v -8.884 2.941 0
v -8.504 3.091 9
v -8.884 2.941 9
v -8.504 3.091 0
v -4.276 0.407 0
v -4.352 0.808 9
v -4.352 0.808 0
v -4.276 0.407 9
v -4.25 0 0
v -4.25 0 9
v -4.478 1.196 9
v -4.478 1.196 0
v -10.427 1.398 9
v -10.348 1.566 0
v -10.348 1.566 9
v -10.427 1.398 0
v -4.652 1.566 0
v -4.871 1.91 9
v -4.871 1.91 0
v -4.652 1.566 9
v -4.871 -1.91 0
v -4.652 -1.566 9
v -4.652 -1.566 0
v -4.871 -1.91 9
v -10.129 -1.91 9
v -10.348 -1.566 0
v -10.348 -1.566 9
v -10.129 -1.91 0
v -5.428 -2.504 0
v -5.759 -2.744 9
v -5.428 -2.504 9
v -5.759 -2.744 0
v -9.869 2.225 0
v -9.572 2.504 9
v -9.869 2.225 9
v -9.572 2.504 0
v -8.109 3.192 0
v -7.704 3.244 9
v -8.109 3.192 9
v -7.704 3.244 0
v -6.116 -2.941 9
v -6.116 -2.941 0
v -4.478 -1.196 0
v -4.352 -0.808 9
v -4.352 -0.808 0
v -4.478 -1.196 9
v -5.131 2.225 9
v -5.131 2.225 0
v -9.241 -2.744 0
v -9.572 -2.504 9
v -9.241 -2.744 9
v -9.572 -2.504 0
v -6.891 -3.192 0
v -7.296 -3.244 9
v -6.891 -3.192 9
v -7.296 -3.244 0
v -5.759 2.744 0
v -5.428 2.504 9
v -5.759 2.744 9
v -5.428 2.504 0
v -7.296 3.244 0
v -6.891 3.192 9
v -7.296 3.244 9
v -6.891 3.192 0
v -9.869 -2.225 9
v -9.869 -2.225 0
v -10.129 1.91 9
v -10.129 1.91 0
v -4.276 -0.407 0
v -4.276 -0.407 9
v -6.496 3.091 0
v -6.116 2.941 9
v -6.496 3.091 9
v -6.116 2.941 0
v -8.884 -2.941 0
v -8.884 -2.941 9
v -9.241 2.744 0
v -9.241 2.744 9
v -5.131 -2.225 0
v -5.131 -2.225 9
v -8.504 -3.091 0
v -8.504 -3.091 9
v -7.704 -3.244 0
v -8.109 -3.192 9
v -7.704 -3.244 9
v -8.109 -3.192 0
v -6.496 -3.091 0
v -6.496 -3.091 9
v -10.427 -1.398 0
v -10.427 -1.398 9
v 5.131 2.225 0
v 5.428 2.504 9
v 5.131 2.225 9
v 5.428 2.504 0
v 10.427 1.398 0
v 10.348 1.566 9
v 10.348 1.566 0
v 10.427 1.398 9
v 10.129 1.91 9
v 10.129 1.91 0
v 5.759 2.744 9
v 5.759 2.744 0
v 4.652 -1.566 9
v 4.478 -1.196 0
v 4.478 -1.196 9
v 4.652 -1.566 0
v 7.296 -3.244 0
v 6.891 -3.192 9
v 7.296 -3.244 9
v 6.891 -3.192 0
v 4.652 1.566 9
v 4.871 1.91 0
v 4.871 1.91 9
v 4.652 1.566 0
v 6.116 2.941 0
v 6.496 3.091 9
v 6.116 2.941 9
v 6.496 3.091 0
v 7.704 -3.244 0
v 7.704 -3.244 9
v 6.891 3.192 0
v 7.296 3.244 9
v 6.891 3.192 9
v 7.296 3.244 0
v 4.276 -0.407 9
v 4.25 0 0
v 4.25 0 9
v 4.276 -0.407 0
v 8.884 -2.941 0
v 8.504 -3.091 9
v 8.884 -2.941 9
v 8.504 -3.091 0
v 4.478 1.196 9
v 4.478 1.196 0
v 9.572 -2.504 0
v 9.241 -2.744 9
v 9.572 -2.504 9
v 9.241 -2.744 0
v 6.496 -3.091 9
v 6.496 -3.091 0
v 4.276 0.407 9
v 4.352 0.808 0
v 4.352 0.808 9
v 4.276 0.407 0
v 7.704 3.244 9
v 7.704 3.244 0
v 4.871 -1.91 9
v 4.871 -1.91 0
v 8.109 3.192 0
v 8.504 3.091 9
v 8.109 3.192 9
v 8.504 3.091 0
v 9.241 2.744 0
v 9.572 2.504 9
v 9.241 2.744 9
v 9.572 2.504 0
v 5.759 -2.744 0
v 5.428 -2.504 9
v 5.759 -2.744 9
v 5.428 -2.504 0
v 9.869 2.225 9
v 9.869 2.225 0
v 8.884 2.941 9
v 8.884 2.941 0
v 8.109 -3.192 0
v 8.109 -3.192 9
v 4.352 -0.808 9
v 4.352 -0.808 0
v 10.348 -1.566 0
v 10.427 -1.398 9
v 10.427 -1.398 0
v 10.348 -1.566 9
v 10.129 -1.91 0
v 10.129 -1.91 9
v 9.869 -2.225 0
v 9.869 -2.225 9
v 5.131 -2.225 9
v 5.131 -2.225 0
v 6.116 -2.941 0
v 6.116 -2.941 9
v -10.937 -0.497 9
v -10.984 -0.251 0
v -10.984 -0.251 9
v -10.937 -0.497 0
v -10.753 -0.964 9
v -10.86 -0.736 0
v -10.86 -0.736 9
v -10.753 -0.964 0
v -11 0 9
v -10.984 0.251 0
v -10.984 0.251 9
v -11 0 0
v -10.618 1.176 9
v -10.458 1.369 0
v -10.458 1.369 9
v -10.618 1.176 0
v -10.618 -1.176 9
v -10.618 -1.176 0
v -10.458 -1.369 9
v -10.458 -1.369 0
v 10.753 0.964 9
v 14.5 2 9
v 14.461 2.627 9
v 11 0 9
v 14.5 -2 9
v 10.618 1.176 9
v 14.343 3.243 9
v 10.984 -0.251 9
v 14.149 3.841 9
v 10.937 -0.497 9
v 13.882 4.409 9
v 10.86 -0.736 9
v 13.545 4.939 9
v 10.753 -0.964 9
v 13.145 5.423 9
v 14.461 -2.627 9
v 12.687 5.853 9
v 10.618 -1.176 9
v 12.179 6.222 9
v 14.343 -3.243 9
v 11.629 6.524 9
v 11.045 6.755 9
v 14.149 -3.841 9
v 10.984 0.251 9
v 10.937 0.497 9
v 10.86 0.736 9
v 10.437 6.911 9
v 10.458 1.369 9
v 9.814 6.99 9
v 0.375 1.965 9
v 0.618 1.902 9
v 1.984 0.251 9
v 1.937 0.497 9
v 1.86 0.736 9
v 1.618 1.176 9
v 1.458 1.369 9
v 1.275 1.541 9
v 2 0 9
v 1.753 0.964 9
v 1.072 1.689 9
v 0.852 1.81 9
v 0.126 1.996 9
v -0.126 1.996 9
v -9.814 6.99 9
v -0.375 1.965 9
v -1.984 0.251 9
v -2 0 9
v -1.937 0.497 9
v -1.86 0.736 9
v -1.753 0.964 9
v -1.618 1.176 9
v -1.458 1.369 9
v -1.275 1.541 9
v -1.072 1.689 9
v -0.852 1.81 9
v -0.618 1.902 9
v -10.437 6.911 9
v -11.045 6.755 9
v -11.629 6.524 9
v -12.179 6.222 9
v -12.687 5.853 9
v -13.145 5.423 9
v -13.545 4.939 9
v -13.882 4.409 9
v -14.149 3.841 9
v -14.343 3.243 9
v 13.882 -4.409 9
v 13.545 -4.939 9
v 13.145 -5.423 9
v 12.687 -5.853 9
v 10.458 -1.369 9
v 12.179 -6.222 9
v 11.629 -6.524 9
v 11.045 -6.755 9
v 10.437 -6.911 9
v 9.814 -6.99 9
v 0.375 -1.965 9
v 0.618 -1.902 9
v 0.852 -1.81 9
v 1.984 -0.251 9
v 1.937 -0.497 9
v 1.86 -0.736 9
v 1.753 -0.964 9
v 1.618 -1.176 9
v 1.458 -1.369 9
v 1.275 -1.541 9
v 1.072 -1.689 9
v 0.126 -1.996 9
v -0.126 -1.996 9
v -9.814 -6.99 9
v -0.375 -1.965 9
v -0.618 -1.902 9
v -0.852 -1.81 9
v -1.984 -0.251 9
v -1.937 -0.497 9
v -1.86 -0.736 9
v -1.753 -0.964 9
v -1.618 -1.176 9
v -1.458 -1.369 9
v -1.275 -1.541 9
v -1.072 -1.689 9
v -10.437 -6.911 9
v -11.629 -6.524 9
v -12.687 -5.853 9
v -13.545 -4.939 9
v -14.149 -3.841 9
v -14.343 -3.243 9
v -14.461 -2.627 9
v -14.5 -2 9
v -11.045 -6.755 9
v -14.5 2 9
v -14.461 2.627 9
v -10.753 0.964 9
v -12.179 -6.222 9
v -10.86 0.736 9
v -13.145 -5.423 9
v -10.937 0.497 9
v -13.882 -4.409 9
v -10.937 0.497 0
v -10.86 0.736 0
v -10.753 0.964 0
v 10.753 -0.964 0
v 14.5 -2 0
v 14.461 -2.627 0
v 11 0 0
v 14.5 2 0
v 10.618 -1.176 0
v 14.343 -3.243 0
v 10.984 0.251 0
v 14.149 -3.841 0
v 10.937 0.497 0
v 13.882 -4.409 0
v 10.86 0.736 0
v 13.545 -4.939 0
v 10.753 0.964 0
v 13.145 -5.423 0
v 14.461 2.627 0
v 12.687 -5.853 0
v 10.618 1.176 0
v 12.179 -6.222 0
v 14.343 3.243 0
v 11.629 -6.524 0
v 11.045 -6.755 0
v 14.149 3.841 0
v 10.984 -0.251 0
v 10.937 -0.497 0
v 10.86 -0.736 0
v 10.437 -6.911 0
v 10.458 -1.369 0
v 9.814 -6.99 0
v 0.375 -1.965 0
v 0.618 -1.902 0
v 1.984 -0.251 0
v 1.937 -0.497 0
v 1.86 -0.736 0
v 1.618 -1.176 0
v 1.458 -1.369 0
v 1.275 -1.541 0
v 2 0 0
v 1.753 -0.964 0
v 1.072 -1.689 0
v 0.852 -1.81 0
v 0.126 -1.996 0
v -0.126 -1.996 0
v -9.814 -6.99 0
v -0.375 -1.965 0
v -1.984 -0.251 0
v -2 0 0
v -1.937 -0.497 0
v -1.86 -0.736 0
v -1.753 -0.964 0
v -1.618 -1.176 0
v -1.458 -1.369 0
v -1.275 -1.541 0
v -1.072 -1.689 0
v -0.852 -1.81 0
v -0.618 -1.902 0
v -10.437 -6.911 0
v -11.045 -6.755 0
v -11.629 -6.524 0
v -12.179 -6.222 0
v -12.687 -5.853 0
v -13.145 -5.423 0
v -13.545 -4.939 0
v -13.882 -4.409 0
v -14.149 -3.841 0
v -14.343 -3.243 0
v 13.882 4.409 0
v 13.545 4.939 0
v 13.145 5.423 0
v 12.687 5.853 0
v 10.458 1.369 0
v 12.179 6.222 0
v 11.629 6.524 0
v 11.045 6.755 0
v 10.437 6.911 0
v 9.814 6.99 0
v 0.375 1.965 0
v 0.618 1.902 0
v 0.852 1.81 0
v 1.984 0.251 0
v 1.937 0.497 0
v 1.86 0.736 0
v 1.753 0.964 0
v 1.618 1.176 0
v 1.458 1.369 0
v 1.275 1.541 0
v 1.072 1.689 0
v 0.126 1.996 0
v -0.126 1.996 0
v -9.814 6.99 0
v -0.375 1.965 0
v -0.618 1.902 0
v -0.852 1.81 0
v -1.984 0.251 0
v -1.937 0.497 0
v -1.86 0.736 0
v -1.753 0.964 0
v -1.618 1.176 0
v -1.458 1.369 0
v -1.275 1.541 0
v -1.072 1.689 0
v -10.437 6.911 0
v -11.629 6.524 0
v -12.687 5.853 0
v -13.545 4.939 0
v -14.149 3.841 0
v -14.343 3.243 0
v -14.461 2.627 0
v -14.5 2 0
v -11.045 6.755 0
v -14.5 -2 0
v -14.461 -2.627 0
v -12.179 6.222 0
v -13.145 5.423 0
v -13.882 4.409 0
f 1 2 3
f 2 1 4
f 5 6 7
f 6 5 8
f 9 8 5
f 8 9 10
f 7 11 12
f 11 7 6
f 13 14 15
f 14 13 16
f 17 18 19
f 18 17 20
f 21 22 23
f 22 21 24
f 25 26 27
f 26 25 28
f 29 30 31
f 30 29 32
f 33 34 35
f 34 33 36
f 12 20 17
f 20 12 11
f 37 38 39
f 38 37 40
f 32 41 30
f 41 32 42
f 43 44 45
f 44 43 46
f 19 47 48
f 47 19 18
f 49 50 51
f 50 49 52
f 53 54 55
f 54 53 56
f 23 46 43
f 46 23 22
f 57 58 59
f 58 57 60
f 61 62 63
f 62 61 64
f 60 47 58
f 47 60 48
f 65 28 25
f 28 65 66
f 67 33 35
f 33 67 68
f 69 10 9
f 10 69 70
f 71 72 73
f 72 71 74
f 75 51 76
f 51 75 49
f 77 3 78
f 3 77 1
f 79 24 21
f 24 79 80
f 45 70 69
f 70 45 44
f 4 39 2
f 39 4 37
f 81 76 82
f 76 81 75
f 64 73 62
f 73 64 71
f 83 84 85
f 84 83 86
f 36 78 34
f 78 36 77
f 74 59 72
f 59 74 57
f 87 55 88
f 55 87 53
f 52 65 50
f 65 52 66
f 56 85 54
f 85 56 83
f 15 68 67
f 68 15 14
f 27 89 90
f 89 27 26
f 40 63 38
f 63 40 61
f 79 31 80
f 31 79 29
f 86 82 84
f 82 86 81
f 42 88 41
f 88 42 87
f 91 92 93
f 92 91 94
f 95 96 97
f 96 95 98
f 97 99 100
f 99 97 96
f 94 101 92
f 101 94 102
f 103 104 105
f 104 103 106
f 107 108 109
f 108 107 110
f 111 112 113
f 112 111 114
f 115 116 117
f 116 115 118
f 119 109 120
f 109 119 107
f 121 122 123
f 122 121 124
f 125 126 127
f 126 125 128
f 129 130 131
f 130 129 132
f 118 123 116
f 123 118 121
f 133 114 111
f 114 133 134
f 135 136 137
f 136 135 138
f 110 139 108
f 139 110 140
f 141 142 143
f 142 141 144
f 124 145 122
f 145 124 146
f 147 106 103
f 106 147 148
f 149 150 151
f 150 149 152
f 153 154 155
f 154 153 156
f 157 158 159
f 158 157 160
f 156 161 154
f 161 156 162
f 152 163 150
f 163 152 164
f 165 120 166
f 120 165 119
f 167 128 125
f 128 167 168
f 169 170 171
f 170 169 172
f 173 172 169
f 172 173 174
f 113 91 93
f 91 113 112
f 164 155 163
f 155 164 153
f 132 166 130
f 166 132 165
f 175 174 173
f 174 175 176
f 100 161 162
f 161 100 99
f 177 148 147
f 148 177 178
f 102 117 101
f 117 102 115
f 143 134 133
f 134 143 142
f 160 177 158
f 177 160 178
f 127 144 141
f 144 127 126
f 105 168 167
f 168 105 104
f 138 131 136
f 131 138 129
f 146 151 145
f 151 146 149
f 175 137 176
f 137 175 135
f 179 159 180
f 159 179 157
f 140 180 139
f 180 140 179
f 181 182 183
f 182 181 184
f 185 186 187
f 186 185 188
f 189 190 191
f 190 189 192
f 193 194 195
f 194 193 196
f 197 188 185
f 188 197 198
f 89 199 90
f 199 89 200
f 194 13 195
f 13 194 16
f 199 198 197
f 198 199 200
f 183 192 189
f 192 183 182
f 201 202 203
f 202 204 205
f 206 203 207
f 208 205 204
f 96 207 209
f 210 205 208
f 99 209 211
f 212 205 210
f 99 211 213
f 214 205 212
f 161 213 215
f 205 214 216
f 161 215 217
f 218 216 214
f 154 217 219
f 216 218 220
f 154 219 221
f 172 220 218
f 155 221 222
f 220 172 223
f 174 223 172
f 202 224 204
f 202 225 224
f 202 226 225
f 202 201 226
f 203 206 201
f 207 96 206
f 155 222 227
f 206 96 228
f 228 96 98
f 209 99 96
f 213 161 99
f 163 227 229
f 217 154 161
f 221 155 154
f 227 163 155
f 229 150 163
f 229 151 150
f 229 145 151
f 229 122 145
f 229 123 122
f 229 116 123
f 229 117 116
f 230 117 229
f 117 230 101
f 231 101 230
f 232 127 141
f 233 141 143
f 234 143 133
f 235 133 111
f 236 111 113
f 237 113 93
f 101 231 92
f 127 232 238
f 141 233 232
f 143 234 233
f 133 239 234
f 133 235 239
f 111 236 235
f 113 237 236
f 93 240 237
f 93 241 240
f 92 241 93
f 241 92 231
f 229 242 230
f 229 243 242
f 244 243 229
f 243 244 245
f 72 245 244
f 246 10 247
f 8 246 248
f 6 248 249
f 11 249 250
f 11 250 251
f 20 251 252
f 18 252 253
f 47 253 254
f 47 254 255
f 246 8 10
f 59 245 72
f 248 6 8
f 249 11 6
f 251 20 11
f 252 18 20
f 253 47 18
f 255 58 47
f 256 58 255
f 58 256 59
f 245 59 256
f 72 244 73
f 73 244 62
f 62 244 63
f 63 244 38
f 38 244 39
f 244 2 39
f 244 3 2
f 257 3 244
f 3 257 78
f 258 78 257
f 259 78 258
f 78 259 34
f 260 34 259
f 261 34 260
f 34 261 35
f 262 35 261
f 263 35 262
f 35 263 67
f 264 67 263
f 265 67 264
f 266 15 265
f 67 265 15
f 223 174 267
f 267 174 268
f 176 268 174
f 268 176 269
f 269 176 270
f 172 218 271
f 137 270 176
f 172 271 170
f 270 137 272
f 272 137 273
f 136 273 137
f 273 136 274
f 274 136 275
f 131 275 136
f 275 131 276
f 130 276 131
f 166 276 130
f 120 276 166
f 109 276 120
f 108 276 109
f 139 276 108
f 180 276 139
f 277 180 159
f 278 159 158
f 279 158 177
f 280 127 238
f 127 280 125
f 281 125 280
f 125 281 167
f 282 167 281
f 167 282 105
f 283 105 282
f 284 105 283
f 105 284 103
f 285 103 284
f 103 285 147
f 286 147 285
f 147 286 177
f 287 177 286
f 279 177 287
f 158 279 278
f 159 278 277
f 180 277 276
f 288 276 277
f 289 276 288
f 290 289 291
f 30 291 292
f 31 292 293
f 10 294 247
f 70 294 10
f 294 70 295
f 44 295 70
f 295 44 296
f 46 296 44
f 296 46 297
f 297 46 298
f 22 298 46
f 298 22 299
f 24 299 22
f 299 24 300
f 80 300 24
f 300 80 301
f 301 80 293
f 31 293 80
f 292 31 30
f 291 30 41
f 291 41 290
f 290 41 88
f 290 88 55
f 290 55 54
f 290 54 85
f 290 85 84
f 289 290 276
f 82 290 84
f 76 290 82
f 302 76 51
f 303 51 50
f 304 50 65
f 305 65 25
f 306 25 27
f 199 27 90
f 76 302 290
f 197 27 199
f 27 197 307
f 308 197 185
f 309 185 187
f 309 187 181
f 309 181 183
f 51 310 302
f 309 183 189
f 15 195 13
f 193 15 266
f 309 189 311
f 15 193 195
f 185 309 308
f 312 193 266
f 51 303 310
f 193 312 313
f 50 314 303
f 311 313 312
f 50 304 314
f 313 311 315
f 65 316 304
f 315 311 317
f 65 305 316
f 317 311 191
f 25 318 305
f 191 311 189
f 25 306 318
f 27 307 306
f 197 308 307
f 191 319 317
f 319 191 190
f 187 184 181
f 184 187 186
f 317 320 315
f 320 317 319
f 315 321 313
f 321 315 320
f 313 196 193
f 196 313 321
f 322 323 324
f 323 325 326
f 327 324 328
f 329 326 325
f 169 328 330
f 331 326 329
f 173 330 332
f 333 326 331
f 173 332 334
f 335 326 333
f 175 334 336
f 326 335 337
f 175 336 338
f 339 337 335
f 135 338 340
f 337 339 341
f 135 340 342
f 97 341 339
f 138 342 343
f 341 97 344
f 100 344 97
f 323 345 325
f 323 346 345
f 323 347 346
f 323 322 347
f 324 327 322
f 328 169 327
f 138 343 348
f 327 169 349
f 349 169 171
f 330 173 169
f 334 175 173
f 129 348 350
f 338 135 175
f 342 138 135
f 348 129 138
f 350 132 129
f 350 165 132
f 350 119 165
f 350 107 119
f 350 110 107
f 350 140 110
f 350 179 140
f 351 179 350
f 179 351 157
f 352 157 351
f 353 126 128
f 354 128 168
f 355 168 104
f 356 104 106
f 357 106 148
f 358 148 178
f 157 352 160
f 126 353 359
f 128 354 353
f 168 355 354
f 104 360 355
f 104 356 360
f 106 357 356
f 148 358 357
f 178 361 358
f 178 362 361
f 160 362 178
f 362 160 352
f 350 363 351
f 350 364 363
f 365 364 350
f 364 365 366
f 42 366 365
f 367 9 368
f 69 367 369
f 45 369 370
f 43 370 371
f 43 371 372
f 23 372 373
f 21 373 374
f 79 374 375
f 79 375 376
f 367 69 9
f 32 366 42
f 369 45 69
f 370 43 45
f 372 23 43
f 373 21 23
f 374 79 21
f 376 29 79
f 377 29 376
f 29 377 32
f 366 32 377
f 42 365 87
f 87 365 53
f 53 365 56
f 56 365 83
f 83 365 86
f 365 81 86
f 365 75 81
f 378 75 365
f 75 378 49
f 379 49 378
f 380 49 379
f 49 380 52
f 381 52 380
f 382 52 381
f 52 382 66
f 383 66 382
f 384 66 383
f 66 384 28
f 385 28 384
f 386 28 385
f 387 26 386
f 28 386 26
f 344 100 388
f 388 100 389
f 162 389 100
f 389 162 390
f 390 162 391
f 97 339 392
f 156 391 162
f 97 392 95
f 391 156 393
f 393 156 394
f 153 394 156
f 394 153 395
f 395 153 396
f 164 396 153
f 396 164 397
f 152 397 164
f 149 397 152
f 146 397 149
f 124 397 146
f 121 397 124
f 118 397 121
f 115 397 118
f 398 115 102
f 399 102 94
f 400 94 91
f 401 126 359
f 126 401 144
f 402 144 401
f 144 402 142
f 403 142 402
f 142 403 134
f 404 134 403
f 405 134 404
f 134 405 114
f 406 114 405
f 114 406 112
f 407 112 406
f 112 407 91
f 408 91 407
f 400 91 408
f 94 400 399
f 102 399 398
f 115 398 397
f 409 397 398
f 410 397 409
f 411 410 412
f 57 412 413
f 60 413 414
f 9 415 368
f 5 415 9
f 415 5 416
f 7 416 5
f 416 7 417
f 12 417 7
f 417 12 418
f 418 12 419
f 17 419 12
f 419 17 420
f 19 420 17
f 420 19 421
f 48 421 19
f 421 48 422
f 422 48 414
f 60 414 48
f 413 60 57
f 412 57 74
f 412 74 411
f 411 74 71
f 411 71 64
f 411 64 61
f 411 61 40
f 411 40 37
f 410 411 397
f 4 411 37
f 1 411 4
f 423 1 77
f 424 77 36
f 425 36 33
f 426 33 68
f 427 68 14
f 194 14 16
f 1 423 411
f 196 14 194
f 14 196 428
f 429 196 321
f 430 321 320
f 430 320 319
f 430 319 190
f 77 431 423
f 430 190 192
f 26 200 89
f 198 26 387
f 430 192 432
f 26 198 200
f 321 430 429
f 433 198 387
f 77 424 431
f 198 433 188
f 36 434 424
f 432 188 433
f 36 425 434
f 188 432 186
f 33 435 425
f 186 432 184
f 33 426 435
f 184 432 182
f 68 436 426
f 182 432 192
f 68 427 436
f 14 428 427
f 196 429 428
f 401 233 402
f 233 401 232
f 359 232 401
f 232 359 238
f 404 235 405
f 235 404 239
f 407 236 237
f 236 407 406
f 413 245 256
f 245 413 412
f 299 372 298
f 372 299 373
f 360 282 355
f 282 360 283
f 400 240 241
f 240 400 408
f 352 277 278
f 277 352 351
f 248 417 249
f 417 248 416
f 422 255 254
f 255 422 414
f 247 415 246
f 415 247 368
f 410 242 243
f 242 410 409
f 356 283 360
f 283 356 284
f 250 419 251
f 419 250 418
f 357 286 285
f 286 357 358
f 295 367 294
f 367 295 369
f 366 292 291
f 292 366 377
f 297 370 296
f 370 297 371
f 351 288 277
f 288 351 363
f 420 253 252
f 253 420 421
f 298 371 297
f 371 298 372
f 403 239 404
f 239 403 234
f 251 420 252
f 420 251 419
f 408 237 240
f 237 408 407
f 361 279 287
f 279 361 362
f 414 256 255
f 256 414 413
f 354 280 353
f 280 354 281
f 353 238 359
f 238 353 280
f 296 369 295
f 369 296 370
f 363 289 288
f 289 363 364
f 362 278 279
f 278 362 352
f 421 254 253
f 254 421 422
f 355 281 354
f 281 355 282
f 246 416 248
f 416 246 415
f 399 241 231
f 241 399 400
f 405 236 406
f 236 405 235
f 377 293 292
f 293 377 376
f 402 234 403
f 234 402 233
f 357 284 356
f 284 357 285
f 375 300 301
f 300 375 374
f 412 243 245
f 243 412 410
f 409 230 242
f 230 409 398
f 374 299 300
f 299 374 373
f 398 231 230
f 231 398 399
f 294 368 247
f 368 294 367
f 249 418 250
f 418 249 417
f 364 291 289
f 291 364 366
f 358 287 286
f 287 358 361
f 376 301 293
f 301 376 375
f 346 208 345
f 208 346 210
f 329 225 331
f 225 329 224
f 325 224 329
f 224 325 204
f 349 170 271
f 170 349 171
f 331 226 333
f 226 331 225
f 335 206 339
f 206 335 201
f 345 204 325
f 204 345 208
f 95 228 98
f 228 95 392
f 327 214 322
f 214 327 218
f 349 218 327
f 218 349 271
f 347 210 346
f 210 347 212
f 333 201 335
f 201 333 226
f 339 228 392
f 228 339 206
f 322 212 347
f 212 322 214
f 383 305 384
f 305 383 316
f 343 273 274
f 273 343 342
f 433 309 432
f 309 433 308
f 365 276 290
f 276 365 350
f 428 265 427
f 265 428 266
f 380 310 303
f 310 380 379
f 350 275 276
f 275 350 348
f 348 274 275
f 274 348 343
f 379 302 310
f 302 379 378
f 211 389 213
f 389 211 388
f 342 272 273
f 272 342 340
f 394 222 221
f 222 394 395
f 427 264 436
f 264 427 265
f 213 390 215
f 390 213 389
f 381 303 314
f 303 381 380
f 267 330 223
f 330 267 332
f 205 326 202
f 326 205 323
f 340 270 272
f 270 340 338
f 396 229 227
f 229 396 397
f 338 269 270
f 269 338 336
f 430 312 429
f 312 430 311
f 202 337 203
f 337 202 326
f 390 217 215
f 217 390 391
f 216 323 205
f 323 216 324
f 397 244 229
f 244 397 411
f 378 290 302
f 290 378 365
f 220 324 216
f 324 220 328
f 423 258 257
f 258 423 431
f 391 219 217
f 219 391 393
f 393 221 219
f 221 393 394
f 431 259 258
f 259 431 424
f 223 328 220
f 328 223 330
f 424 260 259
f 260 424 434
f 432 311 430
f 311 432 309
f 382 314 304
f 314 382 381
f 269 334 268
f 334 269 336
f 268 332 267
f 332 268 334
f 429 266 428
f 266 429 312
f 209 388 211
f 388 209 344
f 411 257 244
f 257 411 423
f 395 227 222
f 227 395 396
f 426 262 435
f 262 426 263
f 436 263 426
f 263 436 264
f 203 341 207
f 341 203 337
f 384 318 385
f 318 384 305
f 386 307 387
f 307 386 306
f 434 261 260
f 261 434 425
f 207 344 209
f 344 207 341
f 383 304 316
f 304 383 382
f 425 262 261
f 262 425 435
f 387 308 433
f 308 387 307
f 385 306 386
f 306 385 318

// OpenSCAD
$fn = 50;

difference() {
	union() {
		hull() {
			translate(v = [-9.5, 2.0, 0]) {
				cylinder(h = 9, r = 5);
			}
			translate(v = [9.5, 2.0, 0]) {
				cylinder(h = 9, r = 5);
			}
			translate(v = [-9.5, -2.0, 0]) {
				cylinder(h = 9, r = 5);
			}
			translate(v = [9.5, -2.0, 0]) {
				cylinder(h = 9, r = 5);
			}
		}
	}
	union() {
		translate(v = [-7.5, 0.0, -100.0]) {
			cylinder(h = 200, r = 3.25);
		}
		translate(v = [7.5, 0.0, -100.0]) {
			cylinder(h = 200, r = 3.25);
		}
		translate(v = [-7.5, 0.0, -100.0]) {
			cylinder(h = 200, r = 1.8);
		}
		translate(v = [7.5, 0.0, -100.0]) {
			cylinder(h = 200, r = 1.8);
		}
		translate(v = [-9.0, 0, 0.0]) {
			cylinder(h = 9, r = 2.0);
		}
		cylinder(h = 9, r = 2.0);
		translate(v = [9.0, 0, 0.0]) {
			cylinder(h = 9, r = 2.0);
		}
	}
}
